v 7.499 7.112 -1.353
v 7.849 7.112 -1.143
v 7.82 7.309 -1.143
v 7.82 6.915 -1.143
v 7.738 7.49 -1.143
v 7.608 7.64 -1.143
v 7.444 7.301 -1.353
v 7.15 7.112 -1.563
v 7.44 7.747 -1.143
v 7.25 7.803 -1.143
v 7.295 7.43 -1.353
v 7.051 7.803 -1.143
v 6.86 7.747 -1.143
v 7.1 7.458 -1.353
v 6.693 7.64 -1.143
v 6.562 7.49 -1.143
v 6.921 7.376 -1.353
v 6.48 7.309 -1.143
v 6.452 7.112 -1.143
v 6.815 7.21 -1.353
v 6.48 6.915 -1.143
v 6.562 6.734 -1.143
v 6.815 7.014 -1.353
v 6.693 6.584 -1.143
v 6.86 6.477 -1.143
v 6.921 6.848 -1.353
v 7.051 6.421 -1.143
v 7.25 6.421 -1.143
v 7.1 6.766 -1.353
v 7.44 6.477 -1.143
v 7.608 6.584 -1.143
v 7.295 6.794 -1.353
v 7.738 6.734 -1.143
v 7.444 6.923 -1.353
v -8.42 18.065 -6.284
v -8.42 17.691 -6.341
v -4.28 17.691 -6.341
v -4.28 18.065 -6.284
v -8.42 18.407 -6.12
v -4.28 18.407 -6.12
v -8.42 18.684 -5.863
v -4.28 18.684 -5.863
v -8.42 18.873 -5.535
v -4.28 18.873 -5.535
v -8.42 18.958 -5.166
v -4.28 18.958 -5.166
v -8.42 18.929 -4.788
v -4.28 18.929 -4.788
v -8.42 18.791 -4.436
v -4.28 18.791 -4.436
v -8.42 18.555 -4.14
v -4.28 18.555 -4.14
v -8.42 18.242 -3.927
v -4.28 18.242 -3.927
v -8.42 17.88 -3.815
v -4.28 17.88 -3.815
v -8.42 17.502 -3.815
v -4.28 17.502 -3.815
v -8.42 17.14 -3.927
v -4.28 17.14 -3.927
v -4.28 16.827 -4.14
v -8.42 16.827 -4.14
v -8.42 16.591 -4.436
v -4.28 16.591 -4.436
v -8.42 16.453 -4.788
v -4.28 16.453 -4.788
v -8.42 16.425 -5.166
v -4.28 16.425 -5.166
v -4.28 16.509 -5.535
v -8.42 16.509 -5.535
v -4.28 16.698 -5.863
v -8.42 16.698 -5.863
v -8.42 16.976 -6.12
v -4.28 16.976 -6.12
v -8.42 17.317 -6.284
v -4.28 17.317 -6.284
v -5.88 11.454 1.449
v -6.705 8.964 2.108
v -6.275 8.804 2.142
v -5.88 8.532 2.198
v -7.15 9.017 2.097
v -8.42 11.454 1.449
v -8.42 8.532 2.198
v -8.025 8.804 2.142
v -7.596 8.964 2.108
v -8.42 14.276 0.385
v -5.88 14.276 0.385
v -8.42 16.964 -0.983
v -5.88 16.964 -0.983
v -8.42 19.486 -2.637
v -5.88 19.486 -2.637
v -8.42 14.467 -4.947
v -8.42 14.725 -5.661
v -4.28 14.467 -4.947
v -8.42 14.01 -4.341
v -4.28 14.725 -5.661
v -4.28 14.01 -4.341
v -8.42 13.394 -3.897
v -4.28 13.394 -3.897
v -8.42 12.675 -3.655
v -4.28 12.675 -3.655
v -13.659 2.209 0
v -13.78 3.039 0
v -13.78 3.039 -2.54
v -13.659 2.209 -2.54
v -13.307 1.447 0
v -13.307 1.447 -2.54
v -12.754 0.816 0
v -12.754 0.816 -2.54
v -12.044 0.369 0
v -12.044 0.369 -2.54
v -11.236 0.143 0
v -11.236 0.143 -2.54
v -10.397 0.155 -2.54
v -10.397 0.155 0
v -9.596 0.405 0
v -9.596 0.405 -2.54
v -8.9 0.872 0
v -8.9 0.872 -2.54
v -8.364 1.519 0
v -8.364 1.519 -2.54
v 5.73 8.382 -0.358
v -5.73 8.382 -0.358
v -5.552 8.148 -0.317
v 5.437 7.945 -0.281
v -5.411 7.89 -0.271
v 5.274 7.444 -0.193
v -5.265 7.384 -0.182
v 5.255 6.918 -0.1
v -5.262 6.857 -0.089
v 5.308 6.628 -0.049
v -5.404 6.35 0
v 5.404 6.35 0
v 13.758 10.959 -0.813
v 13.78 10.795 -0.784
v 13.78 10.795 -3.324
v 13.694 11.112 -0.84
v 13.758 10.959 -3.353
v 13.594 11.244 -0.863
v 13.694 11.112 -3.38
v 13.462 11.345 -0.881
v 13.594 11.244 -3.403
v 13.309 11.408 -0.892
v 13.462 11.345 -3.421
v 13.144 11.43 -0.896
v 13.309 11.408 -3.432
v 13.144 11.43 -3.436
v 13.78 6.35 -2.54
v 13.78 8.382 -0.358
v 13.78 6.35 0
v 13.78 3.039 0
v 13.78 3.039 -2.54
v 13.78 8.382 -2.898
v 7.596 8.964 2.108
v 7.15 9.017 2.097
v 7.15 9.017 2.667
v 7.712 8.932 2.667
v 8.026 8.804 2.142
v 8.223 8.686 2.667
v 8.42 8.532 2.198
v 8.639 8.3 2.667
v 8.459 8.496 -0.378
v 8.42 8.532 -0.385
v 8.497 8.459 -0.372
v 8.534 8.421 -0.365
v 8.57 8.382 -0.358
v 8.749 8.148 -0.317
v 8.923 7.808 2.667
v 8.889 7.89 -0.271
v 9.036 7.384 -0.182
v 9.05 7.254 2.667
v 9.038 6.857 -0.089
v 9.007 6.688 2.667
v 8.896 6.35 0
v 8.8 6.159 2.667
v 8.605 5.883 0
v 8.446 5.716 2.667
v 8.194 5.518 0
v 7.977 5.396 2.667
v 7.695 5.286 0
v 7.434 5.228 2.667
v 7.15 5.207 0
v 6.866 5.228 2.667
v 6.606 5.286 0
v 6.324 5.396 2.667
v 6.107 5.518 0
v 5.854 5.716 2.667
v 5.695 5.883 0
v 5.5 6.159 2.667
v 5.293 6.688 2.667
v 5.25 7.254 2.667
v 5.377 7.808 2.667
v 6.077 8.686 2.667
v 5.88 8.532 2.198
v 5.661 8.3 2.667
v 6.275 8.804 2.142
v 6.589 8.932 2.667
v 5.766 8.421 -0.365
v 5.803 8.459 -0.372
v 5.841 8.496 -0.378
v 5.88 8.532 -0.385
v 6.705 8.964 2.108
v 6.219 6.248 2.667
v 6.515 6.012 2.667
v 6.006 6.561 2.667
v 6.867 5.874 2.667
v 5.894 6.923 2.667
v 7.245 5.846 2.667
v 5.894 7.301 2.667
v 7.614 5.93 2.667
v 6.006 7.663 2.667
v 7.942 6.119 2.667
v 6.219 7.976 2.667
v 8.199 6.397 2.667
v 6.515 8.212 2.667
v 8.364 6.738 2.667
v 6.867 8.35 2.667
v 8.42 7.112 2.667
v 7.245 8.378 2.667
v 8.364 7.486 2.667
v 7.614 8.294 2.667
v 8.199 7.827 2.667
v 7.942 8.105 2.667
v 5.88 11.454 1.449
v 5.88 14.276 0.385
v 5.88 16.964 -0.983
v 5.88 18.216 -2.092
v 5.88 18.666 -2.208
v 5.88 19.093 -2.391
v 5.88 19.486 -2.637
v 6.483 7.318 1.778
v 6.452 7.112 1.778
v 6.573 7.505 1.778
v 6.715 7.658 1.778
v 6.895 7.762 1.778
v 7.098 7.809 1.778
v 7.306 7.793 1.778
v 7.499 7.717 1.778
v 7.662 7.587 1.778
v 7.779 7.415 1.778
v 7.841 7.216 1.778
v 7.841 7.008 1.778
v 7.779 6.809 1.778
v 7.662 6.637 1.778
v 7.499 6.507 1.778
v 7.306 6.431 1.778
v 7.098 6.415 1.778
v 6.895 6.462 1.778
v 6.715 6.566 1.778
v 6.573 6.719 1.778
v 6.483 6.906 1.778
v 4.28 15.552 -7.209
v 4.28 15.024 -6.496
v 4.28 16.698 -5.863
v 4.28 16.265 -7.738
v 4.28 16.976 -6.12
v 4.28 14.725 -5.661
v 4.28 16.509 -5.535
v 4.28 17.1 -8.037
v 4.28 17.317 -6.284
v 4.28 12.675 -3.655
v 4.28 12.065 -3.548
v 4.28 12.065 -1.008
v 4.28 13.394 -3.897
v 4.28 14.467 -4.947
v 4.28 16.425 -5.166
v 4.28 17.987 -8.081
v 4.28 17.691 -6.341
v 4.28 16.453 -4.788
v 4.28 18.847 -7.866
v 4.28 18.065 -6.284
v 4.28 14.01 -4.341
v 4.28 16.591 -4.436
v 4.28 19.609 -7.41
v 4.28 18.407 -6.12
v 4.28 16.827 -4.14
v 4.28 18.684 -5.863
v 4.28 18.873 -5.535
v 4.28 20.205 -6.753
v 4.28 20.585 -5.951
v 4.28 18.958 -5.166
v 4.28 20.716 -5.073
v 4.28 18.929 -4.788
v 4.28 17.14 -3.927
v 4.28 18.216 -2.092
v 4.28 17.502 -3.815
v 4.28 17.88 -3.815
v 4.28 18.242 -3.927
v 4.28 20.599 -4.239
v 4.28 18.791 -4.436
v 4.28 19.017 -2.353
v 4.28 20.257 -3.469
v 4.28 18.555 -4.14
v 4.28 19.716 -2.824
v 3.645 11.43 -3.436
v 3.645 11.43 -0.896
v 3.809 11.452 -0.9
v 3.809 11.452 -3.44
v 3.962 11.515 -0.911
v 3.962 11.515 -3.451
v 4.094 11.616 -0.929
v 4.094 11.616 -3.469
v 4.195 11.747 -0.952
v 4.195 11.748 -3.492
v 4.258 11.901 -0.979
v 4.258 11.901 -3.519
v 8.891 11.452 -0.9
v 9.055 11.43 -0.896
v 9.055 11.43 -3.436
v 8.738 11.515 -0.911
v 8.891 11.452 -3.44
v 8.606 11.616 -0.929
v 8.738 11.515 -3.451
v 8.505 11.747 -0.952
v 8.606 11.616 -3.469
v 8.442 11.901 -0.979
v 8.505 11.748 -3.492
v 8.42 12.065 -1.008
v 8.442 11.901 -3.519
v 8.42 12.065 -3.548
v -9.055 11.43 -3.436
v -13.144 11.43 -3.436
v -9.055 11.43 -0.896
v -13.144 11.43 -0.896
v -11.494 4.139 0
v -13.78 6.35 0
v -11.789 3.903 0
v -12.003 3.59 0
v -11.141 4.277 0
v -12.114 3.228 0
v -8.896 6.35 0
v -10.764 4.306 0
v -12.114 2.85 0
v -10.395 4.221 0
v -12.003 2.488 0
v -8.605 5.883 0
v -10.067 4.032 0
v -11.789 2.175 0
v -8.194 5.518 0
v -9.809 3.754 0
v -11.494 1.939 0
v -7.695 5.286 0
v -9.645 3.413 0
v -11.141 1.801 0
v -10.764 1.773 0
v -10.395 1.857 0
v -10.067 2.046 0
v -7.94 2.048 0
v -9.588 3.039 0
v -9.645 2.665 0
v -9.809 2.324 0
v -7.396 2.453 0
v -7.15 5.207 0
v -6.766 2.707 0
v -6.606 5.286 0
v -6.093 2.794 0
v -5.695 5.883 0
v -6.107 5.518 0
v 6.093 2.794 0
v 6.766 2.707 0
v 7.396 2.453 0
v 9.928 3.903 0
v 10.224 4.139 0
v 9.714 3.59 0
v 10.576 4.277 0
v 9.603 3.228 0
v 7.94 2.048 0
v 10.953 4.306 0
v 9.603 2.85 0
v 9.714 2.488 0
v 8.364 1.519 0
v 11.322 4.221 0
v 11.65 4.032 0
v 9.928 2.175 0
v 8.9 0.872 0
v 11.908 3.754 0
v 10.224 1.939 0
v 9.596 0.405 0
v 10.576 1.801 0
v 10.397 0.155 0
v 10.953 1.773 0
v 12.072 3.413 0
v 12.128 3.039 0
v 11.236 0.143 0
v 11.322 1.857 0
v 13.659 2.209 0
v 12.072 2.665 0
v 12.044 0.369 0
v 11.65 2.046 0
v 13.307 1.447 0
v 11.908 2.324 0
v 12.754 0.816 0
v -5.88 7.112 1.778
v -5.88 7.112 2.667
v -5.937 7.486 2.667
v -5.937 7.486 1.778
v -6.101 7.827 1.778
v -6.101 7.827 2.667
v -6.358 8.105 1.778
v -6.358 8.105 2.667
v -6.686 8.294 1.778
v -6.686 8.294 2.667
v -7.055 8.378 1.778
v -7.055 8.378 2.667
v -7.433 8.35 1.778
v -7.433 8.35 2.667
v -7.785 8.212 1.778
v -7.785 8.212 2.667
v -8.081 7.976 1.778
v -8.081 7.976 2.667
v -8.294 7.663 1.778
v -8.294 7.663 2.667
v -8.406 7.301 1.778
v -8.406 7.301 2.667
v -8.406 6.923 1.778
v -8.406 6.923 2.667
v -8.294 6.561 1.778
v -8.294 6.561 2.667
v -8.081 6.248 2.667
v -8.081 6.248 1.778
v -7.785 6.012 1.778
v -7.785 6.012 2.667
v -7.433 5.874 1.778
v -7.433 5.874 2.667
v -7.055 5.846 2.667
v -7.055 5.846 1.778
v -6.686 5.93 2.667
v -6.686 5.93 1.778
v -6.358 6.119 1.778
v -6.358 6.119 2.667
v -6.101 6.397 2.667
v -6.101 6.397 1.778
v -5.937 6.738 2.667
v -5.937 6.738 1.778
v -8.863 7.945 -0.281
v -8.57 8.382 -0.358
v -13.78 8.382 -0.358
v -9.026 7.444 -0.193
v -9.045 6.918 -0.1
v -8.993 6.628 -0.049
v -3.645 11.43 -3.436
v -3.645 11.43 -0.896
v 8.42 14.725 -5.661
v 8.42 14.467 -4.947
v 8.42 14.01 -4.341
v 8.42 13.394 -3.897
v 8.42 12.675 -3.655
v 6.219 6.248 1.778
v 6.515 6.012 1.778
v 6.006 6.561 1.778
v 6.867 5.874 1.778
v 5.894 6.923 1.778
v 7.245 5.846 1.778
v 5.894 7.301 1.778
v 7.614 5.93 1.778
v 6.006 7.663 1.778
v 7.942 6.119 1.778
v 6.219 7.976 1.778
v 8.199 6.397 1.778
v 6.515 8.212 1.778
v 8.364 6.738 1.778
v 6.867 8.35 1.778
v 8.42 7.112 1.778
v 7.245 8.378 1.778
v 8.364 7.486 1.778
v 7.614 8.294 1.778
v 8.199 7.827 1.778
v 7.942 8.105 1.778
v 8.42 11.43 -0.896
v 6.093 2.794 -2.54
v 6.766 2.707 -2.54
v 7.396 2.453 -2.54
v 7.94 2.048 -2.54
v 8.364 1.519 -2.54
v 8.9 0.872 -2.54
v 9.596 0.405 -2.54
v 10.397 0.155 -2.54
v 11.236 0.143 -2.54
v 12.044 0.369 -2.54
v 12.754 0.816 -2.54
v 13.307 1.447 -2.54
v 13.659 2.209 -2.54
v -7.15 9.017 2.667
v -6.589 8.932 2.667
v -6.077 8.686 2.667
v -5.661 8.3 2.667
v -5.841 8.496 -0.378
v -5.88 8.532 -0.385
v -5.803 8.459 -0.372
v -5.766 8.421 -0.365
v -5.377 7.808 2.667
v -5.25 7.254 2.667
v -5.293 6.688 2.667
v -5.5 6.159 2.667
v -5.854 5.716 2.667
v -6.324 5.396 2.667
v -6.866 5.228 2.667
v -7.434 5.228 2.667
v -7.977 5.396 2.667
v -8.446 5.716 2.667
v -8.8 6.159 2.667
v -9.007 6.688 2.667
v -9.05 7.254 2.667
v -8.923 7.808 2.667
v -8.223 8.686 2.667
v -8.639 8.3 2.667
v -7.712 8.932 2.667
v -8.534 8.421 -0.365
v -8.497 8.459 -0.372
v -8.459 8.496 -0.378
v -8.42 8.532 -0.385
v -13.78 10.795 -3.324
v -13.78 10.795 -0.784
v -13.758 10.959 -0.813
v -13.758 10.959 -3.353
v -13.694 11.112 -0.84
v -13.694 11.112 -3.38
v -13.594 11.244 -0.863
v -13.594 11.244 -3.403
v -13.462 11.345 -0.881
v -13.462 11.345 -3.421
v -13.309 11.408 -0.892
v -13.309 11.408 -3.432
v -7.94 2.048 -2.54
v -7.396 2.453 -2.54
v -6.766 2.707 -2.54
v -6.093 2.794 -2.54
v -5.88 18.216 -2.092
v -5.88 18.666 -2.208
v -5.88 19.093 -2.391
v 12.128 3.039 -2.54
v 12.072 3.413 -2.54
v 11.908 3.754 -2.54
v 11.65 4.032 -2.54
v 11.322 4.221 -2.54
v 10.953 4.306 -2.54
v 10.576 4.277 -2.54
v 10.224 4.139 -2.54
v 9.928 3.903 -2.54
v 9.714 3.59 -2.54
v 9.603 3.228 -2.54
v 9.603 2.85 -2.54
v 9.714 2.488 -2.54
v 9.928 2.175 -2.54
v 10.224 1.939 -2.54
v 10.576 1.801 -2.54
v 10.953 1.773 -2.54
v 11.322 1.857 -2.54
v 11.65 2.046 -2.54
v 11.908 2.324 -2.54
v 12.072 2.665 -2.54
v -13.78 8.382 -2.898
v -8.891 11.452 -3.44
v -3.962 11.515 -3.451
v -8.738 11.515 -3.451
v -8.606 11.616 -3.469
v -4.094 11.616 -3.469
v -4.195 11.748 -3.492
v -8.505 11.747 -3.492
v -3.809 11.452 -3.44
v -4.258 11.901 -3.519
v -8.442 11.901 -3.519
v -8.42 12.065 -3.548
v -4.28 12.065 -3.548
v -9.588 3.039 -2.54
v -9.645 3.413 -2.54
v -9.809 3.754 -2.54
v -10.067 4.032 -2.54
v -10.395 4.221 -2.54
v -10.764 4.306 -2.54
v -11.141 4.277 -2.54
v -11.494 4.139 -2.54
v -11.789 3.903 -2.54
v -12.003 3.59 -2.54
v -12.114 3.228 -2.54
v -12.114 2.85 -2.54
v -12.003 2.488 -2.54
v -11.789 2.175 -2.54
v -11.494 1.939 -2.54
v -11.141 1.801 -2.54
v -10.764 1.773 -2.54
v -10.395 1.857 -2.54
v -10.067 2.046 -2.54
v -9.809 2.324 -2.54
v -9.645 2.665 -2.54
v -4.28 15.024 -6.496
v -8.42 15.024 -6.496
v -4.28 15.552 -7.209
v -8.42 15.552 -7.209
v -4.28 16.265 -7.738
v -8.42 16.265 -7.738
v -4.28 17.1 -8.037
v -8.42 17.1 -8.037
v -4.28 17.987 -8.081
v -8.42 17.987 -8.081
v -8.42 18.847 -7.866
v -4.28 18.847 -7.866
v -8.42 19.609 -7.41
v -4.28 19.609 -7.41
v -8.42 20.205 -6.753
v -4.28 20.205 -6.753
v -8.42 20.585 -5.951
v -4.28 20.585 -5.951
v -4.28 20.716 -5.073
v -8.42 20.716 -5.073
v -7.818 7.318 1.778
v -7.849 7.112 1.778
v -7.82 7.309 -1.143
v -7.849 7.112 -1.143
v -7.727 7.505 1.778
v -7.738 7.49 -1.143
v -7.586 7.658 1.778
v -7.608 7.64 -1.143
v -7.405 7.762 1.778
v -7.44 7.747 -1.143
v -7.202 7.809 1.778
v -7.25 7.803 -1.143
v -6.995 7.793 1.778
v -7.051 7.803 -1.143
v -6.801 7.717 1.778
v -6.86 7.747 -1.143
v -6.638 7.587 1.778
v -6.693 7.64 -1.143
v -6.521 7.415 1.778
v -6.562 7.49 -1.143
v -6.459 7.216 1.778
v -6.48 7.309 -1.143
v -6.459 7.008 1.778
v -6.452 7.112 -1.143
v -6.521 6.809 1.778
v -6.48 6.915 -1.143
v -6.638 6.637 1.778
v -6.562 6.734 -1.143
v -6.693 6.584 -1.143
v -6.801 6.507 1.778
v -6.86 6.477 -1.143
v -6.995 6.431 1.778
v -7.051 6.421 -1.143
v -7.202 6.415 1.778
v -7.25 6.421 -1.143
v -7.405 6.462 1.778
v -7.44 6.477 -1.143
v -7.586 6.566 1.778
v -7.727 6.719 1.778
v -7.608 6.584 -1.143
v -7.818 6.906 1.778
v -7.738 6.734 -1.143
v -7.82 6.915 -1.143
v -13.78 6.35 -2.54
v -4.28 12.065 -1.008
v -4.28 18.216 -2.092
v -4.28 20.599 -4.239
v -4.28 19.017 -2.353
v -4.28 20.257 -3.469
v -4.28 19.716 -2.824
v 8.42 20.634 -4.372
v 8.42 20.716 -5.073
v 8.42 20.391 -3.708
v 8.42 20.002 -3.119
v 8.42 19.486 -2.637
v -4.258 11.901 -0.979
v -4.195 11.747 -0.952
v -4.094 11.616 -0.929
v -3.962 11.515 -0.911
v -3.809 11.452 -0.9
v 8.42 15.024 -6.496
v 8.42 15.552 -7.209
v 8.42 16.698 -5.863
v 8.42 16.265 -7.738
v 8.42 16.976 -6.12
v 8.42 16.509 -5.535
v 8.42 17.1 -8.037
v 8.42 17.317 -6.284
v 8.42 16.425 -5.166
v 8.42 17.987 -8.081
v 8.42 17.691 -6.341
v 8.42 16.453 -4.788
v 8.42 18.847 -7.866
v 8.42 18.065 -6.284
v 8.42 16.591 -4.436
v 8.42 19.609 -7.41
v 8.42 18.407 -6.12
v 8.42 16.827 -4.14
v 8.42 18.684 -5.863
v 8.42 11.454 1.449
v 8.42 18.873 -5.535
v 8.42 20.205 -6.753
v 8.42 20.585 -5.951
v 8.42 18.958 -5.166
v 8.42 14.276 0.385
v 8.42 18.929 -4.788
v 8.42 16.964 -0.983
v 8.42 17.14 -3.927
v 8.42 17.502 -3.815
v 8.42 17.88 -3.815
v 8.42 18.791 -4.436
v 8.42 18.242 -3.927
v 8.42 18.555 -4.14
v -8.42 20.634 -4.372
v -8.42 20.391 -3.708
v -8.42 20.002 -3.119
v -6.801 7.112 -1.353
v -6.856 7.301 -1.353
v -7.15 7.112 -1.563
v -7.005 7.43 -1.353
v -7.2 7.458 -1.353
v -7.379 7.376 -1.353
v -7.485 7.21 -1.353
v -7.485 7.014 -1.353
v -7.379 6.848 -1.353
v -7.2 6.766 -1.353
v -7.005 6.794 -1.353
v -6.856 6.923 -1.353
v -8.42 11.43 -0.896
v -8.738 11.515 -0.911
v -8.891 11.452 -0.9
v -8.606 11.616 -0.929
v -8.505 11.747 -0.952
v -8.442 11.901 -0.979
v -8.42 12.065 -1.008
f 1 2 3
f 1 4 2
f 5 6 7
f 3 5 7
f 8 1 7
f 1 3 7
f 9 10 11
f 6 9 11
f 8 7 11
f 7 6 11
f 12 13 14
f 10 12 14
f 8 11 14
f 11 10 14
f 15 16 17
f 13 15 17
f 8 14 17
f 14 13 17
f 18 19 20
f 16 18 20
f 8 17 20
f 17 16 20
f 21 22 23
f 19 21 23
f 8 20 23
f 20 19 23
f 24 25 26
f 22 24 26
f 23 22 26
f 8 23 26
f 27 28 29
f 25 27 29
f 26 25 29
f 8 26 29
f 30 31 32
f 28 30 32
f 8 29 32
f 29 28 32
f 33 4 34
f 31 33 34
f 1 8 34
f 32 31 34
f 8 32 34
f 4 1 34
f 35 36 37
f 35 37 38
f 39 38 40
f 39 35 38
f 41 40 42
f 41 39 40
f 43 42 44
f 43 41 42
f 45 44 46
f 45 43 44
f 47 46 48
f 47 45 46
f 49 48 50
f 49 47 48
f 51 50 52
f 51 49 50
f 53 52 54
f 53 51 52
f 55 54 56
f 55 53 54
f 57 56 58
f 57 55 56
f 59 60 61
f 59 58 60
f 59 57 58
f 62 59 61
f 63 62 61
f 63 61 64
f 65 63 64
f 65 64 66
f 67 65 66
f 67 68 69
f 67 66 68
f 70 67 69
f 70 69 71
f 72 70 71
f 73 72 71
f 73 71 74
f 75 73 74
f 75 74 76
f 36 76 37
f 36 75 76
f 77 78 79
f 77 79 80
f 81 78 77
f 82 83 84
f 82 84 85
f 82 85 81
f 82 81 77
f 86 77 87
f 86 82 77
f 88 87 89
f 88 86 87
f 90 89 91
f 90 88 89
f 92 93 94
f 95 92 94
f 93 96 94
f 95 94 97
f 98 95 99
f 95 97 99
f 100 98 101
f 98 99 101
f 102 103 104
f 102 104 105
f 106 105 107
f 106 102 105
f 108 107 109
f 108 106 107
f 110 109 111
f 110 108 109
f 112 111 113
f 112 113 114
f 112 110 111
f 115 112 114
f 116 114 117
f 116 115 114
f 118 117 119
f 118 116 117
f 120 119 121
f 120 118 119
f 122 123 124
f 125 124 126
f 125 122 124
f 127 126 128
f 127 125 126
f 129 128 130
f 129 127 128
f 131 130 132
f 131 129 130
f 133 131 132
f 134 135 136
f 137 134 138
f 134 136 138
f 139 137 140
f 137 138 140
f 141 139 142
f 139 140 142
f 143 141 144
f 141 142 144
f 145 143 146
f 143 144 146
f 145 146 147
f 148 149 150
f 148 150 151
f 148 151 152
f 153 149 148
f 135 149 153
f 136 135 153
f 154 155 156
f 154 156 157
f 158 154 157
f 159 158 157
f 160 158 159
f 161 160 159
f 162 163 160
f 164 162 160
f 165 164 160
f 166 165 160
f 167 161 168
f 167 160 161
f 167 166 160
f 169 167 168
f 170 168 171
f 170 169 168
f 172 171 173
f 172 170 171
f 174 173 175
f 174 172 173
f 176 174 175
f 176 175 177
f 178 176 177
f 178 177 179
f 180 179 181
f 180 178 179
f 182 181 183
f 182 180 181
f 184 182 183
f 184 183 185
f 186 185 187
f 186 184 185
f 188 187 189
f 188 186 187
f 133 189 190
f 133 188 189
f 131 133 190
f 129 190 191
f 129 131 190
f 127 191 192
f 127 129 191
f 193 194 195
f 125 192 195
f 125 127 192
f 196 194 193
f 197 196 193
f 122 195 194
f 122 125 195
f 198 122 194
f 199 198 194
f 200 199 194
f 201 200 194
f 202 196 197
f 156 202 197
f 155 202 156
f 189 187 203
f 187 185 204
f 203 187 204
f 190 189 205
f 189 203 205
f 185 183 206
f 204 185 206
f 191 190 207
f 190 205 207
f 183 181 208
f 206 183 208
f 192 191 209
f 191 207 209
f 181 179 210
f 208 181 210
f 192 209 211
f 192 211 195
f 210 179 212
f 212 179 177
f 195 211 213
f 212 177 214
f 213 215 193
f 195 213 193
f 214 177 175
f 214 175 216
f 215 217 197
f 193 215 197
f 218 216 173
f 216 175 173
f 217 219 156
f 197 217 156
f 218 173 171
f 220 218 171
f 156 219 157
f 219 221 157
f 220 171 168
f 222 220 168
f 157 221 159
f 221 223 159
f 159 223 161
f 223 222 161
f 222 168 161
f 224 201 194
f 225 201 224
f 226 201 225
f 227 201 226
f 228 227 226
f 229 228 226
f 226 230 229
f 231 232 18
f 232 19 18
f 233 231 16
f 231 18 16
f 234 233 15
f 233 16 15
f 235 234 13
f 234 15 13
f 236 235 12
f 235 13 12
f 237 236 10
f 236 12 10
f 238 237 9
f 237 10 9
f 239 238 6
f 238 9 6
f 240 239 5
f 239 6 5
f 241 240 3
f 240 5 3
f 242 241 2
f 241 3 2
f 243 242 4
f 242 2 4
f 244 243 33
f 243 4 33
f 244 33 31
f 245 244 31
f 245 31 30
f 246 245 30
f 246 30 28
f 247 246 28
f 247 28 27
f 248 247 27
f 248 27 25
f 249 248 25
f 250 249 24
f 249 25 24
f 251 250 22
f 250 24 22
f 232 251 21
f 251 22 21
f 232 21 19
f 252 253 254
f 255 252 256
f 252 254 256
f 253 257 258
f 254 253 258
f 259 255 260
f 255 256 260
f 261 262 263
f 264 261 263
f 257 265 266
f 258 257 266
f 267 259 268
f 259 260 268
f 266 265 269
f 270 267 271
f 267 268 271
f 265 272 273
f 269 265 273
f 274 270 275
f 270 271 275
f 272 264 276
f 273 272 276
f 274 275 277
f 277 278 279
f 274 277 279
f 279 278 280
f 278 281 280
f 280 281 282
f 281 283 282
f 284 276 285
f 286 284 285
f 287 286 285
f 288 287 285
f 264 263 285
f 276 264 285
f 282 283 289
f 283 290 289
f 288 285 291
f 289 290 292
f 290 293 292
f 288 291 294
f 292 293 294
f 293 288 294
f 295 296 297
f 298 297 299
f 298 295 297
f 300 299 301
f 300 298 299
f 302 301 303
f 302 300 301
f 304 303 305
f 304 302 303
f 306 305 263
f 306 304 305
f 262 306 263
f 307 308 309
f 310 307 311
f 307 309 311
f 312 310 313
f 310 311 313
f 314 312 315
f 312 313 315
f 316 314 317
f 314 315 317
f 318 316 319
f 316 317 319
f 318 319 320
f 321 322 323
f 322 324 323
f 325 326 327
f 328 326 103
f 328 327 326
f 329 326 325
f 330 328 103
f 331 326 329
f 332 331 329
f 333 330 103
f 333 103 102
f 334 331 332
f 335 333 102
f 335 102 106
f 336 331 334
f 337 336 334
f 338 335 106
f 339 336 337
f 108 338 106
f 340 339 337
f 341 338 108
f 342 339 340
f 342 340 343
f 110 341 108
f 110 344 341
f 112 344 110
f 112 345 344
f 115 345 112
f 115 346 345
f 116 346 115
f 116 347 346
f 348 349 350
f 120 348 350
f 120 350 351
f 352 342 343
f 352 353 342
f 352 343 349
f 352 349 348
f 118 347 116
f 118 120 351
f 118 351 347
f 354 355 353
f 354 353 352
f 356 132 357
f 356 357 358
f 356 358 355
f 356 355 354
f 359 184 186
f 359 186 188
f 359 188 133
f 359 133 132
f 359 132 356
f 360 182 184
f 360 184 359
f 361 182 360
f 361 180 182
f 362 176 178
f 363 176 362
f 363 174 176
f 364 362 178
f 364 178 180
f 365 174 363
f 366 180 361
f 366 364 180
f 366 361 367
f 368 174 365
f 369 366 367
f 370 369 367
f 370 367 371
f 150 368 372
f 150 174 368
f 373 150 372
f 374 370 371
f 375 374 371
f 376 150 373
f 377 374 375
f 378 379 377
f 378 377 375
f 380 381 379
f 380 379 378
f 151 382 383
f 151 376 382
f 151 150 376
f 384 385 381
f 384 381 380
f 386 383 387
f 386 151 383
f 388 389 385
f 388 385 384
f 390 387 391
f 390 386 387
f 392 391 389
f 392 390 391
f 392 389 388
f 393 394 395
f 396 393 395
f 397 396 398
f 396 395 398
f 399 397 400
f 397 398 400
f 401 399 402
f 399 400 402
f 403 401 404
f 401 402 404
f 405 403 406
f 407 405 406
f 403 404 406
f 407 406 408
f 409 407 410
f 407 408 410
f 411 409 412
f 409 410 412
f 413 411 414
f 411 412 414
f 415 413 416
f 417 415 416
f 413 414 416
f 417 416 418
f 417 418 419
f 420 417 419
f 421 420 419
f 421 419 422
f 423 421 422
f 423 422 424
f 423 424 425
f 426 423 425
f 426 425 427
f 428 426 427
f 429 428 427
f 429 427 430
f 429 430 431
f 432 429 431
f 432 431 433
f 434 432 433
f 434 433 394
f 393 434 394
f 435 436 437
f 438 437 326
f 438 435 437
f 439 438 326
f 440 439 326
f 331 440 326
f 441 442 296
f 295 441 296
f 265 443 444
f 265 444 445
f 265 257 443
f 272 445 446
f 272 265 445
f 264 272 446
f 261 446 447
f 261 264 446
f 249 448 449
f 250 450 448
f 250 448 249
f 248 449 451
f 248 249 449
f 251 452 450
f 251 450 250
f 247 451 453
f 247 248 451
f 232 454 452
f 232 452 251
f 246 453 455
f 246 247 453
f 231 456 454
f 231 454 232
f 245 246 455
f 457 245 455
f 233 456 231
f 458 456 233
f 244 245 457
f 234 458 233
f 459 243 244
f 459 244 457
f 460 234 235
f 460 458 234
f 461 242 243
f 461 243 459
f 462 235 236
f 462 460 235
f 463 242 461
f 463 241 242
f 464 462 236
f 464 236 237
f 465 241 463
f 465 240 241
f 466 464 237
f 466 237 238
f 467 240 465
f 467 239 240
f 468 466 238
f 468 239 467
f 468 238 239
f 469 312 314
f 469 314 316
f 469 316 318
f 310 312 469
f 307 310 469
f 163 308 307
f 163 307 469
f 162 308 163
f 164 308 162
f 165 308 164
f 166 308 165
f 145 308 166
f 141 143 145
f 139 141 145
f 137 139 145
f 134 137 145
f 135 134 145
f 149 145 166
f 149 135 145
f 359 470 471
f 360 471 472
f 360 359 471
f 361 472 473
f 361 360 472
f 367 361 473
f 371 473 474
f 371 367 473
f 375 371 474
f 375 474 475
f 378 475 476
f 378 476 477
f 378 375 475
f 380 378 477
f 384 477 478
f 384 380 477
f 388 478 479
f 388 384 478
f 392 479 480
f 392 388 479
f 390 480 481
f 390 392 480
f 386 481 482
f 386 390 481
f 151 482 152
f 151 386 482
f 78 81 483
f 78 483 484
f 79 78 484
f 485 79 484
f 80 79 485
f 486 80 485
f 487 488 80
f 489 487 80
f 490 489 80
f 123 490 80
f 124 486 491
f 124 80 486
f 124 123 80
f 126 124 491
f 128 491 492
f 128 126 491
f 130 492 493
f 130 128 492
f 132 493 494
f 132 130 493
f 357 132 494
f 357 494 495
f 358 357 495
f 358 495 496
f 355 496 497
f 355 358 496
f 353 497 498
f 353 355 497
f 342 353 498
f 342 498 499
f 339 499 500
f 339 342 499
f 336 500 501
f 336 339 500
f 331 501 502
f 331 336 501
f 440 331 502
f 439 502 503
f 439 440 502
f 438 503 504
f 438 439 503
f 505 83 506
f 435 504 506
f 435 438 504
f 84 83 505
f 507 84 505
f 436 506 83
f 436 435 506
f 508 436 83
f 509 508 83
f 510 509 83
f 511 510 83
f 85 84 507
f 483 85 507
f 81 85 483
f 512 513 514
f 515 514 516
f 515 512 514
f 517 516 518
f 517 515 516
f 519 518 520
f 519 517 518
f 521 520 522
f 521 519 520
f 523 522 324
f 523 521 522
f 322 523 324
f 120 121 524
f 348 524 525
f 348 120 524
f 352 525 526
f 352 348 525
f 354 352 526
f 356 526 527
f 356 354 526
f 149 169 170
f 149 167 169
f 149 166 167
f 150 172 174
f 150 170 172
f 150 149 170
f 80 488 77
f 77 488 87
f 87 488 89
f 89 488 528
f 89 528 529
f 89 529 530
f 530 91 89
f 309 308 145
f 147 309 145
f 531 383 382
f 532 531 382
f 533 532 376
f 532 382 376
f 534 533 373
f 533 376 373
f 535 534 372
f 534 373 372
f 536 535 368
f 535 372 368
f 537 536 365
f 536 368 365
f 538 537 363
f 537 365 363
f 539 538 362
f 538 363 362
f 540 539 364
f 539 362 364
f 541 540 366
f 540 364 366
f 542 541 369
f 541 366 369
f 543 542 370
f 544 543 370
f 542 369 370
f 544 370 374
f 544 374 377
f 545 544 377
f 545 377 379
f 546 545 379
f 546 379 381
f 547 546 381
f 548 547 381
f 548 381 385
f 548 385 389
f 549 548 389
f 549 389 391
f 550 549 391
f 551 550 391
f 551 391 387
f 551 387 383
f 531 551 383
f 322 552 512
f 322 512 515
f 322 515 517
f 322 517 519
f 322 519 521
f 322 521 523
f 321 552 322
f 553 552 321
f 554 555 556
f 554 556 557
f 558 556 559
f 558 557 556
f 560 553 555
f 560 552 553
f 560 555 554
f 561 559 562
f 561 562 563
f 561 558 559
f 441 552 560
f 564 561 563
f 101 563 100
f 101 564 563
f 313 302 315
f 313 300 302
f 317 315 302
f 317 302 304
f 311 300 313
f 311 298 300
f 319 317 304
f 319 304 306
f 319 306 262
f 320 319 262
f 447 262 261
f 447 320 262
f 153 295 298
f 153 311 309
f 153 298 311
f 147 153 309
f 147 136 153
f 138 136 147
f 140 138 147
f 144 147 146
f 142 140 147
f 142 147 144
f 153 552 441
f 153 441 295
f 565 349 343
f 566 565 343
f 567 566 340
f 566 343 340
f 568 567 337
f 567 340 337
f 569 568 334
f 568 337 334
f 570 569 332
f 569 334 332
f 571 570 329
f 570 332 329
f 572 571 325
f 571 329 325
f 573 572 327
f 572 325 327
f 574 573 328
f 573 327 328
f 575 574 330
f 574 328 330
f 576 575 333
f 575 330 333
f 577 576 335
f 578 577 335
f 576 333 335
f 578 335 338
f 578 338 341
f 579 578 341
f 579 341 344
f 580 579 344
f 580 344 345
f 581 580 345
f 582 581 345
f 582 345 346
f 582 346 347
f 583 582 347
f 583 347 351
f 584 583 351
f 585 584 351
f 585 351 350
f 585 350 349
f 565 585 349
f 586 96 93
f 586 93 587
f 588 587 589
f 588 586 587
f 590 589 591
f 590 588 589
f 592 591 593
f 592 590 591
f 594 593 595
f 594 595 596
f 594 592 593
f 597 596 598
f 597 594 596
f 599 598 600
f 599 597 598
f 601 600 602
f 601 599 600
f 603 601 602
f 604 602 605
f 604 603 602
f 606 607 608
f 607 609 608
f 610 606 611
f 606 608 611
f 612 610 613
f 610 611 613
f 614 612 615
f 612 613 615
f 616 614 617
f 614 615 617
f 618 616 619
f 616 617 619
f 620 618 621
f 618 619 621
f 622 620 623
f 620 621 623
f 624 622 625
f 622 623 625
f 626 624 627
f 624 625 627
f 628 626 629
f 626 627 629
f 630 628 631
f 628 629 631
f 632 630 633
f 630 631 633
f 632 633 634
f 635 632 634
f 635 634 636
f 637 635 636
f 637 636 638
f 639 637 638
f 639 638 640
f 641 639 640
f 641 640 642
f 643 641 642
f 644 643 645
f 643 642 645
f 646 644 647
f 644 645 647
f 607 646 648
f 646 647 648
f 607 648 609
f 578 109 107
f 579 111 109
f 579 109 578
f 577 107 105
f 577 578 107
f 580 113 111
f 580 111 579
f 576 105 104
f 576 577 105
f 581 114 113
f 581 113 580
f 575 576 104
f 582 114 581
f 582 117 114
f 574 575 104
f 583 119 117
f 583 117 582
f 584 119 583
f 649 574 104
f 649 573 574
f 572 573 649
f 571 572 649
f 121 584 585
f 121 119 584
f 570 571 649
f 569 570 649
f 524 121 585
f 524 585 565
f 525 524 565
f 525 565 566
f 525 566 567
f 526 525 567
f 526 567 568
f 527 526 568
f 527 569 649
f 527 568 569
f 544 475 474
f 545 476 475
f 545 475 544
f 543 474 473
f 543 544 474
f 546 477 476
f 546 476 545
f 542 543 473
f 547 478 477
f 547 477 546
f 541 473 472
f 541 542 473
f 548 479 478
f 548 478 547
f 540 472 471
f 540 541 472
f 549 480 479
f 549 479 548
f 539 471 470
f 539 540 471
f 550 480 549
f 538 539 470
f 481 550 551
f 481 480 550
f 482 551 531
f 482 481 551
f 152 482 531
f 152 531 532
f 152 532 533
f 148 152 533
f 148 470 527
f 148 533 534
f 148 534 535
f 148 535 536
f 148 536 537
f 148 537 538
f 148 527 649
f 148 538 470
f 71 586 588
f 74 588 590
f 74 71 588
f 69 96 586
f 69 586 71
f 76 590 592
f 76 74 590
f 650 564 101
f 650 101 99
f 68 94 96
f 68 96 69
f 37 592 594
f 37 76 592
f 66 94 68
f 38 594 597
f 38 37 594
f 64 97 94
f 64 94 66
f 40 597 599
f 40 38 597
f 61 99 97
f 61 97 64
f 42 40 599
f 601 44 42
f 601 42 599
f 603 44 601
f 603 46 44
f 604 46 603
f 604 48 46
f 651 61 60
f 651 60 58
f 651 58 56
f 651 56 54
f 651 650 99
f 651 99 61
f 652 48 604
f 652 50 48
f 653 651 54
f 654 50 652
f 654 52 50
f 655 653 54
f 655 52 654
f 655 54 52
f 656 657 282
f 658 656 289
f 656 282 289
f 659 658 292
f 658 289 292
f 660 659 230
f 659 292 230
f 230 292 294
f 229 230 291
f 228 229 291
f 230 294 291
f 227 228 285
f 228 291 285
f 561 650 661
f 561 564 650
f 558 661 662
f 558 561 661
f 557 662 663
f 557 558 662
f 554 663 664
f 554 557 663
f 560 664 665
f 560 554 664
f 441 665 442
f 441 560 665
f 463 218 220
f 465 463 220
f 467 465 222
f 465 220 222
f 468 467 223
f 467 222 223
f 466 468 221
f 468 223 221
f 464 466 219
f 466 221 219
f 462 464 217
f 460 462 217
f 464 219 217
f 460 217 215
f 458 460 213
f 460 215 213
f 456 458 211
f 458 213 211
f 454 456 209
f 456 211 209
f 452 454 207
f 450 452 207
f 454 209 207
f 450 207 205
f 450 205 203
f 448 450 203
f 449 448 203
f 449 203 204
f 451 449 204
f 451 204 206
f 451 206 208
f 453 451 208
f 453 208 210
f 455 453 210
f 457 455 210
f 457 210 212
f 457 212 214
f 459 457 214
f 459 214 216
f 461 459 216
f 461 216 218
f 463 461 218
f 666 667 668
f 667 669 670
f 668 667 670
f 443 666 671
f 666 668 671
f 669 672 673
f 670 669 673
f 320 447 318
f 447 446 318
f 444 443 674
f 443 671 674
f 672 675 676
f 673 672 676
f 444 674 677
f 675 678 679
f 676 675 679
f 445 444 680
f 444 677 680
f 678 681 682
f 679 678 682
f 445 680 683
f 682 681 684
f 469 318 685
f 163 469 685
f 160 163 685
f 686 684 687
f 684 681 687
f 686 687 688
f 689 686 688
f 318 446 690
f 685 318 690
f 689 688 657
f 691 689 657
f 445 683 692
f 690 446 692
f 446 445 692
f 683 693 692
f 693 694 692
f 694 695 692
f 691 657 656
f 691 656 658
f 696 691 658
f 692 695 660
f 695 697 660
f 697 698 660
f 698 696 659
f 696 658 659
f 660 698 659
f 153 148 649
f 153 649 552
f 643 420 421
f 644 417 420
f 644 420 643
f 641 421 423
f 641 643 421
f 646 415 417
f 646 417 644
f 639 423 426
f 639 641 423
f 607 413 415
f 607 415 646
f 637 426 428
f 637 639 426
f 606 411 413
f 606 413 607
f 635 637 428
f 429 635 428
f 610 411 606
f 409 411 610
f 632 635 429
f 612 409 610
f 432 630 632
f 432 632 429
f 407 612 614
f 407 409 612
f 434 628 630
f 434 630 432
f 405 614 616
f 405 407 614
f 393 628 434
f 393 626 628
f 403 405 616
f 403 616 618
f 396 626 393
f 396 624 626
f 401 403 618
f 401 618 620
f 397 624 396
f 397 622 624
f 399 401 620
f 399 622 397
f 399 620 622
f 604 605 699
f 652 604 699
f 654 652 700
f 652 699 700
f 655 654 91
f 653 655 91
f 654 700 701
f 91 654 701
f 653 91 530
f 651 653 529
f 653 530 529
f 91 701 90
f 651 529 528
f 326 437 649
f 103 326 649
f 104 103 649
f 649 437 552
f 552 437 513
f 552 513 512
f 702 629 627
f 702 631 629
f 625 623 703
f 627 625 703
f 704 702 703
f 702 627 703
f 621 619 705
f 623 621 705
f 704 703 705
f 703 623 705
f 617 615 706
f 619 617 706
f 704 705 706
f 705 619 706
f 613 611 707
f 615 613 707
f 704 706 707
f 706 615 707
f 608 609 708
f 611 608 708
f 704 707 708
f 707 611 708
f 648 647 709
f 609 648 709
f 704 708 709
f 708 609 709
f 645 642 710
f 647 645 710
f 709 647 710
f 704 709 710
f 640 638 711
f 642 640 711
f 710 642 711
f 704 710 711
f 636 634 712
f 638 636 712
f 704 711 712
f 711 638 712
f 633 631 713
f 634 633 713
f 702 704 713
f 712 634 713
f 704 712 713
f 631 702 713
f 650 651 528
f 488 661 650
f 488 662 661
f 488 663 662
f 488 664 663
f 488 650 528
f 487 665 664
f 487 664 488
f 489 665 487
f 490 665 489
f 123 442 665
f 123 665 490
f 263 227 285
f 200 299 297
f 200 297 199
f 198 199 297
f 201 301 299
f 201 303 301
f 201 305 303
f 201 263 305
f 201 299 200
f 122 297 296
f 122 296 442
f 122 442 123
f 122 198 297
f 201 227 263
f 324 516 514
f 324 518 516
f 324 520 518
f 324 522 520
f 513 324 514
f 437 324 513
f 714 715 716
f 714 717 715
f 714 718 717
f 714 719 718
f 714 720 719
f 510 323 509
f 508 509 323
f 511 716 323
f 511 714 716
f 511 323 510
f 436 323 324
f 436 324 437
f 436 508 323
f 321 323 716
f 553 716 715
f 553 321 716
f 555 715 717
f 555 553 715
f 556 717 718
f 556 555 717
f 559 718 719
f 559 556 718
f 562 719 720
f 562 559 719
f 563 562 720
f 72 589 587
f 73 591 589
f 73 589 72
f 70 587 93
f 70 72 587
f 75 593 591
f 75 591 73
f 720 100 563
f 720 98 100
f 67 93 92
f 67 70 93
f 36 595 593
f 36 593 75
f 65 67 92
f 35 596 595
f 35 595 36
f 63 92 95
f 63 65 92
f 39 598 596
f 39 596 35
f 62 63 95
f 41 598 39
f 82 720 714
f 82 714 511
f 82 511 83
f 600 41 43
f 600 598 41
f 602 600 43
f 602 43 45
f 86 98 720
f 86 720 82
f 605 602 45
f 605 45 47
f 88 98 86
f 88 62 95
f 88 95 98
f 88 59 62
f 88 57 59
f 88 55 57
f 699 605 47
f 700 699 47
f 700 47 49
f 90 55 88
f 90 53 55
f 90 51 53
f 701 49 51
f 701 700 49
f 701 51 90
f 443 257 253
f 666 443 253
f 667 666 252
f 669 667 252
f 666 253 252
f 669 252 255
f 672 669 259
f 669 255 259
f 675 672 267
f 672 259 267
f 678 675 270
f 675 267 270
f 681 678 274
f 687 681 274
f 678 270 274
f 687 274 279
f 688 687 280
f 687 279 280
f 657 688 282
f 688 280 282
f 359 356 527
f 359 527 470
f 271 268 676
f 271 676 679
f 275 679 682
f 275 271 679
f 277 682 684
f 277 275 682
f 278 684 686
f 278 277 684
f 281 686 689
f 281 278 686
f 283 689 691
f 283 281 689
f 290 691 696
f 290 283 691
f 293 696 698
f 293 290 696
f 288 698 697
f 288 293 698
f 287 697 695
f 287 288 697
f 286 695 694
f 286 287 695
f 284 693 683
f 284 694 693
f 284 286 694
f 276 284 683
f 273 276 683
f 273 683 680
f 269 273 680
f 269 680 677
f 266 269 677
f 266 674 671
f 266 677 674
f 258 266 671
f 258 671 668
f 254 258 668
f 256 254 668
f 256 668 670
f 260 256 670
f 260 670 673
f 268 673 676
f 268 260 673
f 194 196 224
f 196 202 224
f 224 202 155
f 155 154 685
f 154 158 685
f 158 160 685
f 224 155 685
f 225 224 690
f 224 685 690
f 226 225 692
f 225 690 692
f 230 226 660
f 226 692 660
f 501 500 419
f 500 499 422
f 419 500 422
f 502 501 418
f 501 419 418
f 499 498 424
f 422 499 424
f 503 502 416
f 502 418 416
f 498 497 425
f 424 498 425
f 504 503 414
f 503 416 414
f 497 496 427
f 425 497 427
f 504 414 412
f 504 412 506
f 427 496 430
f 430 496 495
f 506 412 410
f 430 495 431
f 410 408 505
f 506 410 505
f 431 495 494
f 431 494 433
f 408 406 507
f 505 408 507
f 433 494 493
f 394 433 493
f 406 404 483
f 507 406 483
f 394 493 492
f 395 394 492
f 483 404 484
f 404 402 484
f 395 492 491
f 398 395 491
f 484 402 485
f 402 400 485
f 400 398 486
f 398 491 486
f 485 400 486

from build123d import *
from build123d.topology import SkipClean

# Parameters (mm, degrees)
BOSS_EXTRUDE1_DEPTH                                 = 13.7795
SKETCH3_R                                           = 1.27
CUT_EXTRUDE1_DEPTH                                  = 28.24278526
BOSS_EXTRUDE3_REACH                                 = 29.243
SKETCH4_R                                           = 3.024456955
BOSS_EXTRUDE3_DIRECTION_2_REACH                     = 29.243
CUT_EXTRUDE2_START                                  = -27.686
SKETCH5_R                                           = 1.27
CUT_EXTRUDE2_DEPTH                                  = 27.686
SKETCH6_W                                           = 5.3594
SKETCH6_H                                           = 6.04891391
SKETCH6_W_2                                         = 8.5598
CUT_EXTRUDE3_DEPTH                                  = 27.163772894
FILLET1_R                                           = 2.54
BOSS_EXTRUDE5_DEPTH                                 = 2.54
SKETCH8_R                                           = 1.905
BOSS_EXTRUDE6_DEPTH                                 = 5.207
CBORE_FOR_00_BINDING_HEAD_MACHINE_SCREW_D           = 1.397
CBORE_FOR_00_BINDING_HEAD_MACHINE_SCREW_DEPTH       = 3.81
CBORE_FOR_00_BINDING_HEAD_MACHINE_SCREW_CBORE_D     = 2.54
CBORE_FOR_00_BINDING_HEAD_MACHINE_SCREW_CBORE_DEPTH = 0.889
CBORE_FOR_00_BINDING_HEAD_MACHINE_SCREW_TIP         = 0.419701142
FILLET3_R                                           = 0.635


with BuildPart() as part:
    # Sketch2 → Boss-Extrude1 (new, symmetric)
    with BuildSketch(Plane(origin=(0, 0, 0), x_dir=(0, 0, -1), z_dir=(1, 0, 0))):
        Polygon((0.358296425, 8.382), (0, 6.35), (0, 0), (2.54, 0), (2.54, 6.35), (2.898296425, 8.382), (5.451158451, 22.86), (2.911158451, 22.86), align=None)
    extrude(amount=BOSS_EXTRUDE1_DEPTH, both=True)

    # Sketch3 → Cut-Extrude1 (cut, through all)
    with BuildSketch(Plane.XY):
        with Locations((-10.8585, 3.039071392)):
            Circle(SKETCH3_R)
        with Locations((10.8585, 3.039071392)):
            Circle(SKETCH3_R)
        with BuildLine():
            Line((-6.093079, 2.794), (6.093079, 2.794))
            ThreePointArc((6.093079, 2.794), (7.395567274, 2.453324554), (8.364453302, 1.518554352))
            ThreePointArc((8.364453302, 1.518554352), (11.648161508, 0.226834613), (13.7795, 3.039071392))
            Line((13.7795, 3.039071392), (14.4145, 3.039071392))
            Line((14.4145, 3.039071392), (14.4145, -0.635))
            Line((14.4145, -0.635), (-14.4145, -0.635))
            Line((-14.4145, -0.635), (-14.4145, 3.039071392))
            Line((-14.4145, 3.039071392), (-13.7795, 3.039071392))
            ThreePointArc((-13.7795, 3.039071392), (-11.648161508, 0.226834613), (-8.364453302, 1.518554352))
            ThreePointArc((-8.364453302, 1.518554352), (-7.395567274, 2.453324554), (-6.093079, 2.794))
        make_face()
        Polygon((-14.4145, 11.43), (-8.4201, 11.43), (-8.4201, 22.86), (-4.2799, 22.86), (-4.2799, 11.43), (4.2799, 11.43), (4.2799, 22.86), (8.4201, 22.86), (8.4201, 11.43), (14.4145, 11.43), (14.4145, 23.495), (-14.4145, 23.495), align=None)
    extrude(amount=-CUT_EXTRUDE1_DEPTH, mode=Mode.SUBTRACT)

    # Boss-Extrude3: up to this face of the body (flat: up to its plane)
    boss_extrude3_end = Plane(part.part.faces().sort_by_distance((13.7795, 7.234535696, -1.541147855))[0])
    # Sketch4 → Boss-Extrude3 (add, up to the picked face)
    with BuildSketch(Plane(origin=(0, 0, 0), x_dir=(0, 0, -1), z_dir=(1, 0, 0)), mode=Mode.PRIVATE) as boss_extrude3_sk1:
        with Locations(Location((5.070856, 17.6911, 0), (0, 0, 180))):
            Circle(SKETCH4_R)
    boss_extrude3_tool1 = split(extrude(boss_extrude3_sk1.sketch, amount=BOSS_EXTRUDE3_REACH, mode=Mode.PRIVATE), bisect_by=boss_extrude3_end, keep=Keep.BOTH, mode=Mode.PRIVATE)
    add(boss_extrude3_tool1.solids().sort_by(Axis((0, 17.6911, -5.070856), (1, 0, 0)))[0])

    # Boss-Extrude3 direction 2: up to this face of the body (flat: up to its plane)
    boss_extrude3_direction_2_end = Plane(part.part.faces().sort_by_distance((-13.7795, 7.234535696, -1.541147855))[0])
    # Sketch4 → Boss-Extrude3 direction 2 (add, up to the picked face)
    with BuildSketch(Plane(origin=(0, 0, 0), x_dir=(0, 0, -1), z_dir=(1, 0, 0)), mode=Mode.PRIVATE) as boss_extrude3_direction_2_sk1:
        with Locations(Location((5.070856, 17.6911, 0), (0, 0, 180))):
            Circle(SKETCH4_R)
    boss_extrude3_direction_2_tool1 = split(extrude(boss_extrude3_direction_2_sk1.sketch, amount=-BOSS_EXTRUDE3_DIRECTION_2_REACH, mode=Mode.PRIVATE), bisect_by=boss_extrude3_direction_2_end, keep=Keep.BOTH, mode=Mode.PRIVATE)
    add(boss_extrude3_direction_2_tool1.solids().sort_by(Axis((0, 17.6911, -5.070856), (-1, 0, 0)))[0])

    # Sketch5 → Cut-Extrude2 (cut)
    with SkipClean():  # the faces are left unmerged after this step: merging them gives an invalid solid
        with BuildSketch(Plane(origin=(13.7795, 0, 0), x_dir=(0, 0, -1), z_dir=(1, 0, 0)).offset(CUT_EXTRUDE2_START)):
            with Locations((5.070856, 17.6911)):
                Circle(SKETCH5_R)
            with BuildLine():
                Line((2.092347342, 18.216291439), (2.911158451, 22.86))
                Line((2.911158451, 22.86), (5.451158451, 22.86))
                Line((5.451158451, 22.86), (5.073035146, 20.71555617))
                ThreePointArc((5.073035146, 20.71555617), (3.12760733, 20.008668658), (2.092347342, 18.216291439))
            make_face()
        extrude(amount=CUT_EXTRUDE2_DEPTH, mode=Mode.SUBTRACT)

    # Sketch6 → Cut-Extrude3 (cut, through all)
    with BuildSketch(Plane.XY):
        with Locations((-11.0998, 17.6911)):
            Rectangle(SKETCH6_W, SKETCH6_H)
        with Locations((0, 17.6911)):
            Rectangle(SKETCH6_W_2, SKETCH6_H)
        with Locations((11.0998, 17.6911)):
            Rectangle(SKETCH6_W, SKETCH6_H)
    extrude(amount=-CUT_EXTRUDE3_DEPTH, mode=Mode.SUBTRACT)

    # Fillet1
    fillet1_edges = [part.edges().sort_by_distance(p)[0] for p in [
        (-6.35, 14.848295543, -4.038478794),
        (6.35, 14.848295543, -4.038478794),
    ]]
    fillet(fillet1_edges, radius=FILLET1_R)

    # Sketch7 → Boss-Extrude5 (add)
    with BuildSketch(Plane.ZY.offset(8.4201)):
        with BuildLine():
            Line((0, 6.35), (2.54, 6.35))
            ThreePointArc((2.54, 6.35), (0.810559409, 13.256647786), (-2.636800213, 19.486291439))
            ThreePointArc((-2.636800213, 19.486291439), (-2.29107391, 18.882801056), (-2.092347342, 18.216291439))
            Line((-2.092347342, 18.216291439), (0, 6.35))
        make_face()
    boss_extrude5 = extrude(amount=-BOSS_EXTRUDE5_DEPTH)

    # Mirror1: Boss-Extrude5 across plane
    add(boss_extrude5.mirror(Plane(origin=(0, 0, 0), x_dir=(0, 0, 1), z_dir=(1, 0, 0))))

    # Sketch8 → Boss-Extrude6 (add)
    with BuildSketch(Plane(origin=(0, 0, -2.54), x_dir=(-1, 0, 0), z_dir=(0, 0, -1))):
        with Locations(Location((7.1501, 7.112, 0), (0, 0, 90))):
            Circle(SKETCH8_R)
        with Locations(Location((-7.1501, 7.112, 0), (0, 0, 90))):
            Circle(SKETCH8_R)
    extrude(amount=-BOSS_EXTRUDE6_DEPTH)

    # CBORE for #00 Binding Head Machine Screw1
    with Locations(Plane.XY.offset(2.667)):
        with Locations((-7.1501, 7.112), (7.1501, 7.112)):
            CounterBoreHole(CBORE_FOR_00_BINDING_HEAD_MACHINE_SCREW_D / 2, CBORE_FOR_00_BINDING_HEAD_MACHINE_SCREW_CBORE_D / 2, CBORE_FOR_00_BINDING_HEAD_MACHINE_SCREW_CBORE_DEPTH, depth=CBORE_FOR_00_BINDING_HEAD_MACHINE_SCREW_DEPTH)
            with Locations((0, 0, -(CBORE_FOR_00_BINDING_HEAD_MACHINE_SCREW_DEPTH + CBORE_FOR_00_BINDING_HEAD_MACHINE_SCREW_TIP / 2))):  # 118° drill point
                Cone(0, CBORE_FOR_00_BINDING_HEAD_MACHINE_SCREW_D / 2, CBORE_FOR_00_BINDING_HEAD_MACHINE_SCREW_TIP, mode=Mode.SUBTRACT)

    # Fillet3
    fillet3_edges = [part.edges().sort_by_distance(p)[0] for p in [
        (-13.7795, 11.43, -2.165741062),
        (13.7795, 11.43, -2.165741062),
        (8.4201, 11.43, -2.165741062),
        (4.2799, 11.43, -2.165741062),
        (-4.2799, 11.43, -2.165741062),
        (-8.4201, 11.43, -2.165741062),
    ]]
    fillet(fillet3_edges, radius=FILLET3_R)


solid = part.part
